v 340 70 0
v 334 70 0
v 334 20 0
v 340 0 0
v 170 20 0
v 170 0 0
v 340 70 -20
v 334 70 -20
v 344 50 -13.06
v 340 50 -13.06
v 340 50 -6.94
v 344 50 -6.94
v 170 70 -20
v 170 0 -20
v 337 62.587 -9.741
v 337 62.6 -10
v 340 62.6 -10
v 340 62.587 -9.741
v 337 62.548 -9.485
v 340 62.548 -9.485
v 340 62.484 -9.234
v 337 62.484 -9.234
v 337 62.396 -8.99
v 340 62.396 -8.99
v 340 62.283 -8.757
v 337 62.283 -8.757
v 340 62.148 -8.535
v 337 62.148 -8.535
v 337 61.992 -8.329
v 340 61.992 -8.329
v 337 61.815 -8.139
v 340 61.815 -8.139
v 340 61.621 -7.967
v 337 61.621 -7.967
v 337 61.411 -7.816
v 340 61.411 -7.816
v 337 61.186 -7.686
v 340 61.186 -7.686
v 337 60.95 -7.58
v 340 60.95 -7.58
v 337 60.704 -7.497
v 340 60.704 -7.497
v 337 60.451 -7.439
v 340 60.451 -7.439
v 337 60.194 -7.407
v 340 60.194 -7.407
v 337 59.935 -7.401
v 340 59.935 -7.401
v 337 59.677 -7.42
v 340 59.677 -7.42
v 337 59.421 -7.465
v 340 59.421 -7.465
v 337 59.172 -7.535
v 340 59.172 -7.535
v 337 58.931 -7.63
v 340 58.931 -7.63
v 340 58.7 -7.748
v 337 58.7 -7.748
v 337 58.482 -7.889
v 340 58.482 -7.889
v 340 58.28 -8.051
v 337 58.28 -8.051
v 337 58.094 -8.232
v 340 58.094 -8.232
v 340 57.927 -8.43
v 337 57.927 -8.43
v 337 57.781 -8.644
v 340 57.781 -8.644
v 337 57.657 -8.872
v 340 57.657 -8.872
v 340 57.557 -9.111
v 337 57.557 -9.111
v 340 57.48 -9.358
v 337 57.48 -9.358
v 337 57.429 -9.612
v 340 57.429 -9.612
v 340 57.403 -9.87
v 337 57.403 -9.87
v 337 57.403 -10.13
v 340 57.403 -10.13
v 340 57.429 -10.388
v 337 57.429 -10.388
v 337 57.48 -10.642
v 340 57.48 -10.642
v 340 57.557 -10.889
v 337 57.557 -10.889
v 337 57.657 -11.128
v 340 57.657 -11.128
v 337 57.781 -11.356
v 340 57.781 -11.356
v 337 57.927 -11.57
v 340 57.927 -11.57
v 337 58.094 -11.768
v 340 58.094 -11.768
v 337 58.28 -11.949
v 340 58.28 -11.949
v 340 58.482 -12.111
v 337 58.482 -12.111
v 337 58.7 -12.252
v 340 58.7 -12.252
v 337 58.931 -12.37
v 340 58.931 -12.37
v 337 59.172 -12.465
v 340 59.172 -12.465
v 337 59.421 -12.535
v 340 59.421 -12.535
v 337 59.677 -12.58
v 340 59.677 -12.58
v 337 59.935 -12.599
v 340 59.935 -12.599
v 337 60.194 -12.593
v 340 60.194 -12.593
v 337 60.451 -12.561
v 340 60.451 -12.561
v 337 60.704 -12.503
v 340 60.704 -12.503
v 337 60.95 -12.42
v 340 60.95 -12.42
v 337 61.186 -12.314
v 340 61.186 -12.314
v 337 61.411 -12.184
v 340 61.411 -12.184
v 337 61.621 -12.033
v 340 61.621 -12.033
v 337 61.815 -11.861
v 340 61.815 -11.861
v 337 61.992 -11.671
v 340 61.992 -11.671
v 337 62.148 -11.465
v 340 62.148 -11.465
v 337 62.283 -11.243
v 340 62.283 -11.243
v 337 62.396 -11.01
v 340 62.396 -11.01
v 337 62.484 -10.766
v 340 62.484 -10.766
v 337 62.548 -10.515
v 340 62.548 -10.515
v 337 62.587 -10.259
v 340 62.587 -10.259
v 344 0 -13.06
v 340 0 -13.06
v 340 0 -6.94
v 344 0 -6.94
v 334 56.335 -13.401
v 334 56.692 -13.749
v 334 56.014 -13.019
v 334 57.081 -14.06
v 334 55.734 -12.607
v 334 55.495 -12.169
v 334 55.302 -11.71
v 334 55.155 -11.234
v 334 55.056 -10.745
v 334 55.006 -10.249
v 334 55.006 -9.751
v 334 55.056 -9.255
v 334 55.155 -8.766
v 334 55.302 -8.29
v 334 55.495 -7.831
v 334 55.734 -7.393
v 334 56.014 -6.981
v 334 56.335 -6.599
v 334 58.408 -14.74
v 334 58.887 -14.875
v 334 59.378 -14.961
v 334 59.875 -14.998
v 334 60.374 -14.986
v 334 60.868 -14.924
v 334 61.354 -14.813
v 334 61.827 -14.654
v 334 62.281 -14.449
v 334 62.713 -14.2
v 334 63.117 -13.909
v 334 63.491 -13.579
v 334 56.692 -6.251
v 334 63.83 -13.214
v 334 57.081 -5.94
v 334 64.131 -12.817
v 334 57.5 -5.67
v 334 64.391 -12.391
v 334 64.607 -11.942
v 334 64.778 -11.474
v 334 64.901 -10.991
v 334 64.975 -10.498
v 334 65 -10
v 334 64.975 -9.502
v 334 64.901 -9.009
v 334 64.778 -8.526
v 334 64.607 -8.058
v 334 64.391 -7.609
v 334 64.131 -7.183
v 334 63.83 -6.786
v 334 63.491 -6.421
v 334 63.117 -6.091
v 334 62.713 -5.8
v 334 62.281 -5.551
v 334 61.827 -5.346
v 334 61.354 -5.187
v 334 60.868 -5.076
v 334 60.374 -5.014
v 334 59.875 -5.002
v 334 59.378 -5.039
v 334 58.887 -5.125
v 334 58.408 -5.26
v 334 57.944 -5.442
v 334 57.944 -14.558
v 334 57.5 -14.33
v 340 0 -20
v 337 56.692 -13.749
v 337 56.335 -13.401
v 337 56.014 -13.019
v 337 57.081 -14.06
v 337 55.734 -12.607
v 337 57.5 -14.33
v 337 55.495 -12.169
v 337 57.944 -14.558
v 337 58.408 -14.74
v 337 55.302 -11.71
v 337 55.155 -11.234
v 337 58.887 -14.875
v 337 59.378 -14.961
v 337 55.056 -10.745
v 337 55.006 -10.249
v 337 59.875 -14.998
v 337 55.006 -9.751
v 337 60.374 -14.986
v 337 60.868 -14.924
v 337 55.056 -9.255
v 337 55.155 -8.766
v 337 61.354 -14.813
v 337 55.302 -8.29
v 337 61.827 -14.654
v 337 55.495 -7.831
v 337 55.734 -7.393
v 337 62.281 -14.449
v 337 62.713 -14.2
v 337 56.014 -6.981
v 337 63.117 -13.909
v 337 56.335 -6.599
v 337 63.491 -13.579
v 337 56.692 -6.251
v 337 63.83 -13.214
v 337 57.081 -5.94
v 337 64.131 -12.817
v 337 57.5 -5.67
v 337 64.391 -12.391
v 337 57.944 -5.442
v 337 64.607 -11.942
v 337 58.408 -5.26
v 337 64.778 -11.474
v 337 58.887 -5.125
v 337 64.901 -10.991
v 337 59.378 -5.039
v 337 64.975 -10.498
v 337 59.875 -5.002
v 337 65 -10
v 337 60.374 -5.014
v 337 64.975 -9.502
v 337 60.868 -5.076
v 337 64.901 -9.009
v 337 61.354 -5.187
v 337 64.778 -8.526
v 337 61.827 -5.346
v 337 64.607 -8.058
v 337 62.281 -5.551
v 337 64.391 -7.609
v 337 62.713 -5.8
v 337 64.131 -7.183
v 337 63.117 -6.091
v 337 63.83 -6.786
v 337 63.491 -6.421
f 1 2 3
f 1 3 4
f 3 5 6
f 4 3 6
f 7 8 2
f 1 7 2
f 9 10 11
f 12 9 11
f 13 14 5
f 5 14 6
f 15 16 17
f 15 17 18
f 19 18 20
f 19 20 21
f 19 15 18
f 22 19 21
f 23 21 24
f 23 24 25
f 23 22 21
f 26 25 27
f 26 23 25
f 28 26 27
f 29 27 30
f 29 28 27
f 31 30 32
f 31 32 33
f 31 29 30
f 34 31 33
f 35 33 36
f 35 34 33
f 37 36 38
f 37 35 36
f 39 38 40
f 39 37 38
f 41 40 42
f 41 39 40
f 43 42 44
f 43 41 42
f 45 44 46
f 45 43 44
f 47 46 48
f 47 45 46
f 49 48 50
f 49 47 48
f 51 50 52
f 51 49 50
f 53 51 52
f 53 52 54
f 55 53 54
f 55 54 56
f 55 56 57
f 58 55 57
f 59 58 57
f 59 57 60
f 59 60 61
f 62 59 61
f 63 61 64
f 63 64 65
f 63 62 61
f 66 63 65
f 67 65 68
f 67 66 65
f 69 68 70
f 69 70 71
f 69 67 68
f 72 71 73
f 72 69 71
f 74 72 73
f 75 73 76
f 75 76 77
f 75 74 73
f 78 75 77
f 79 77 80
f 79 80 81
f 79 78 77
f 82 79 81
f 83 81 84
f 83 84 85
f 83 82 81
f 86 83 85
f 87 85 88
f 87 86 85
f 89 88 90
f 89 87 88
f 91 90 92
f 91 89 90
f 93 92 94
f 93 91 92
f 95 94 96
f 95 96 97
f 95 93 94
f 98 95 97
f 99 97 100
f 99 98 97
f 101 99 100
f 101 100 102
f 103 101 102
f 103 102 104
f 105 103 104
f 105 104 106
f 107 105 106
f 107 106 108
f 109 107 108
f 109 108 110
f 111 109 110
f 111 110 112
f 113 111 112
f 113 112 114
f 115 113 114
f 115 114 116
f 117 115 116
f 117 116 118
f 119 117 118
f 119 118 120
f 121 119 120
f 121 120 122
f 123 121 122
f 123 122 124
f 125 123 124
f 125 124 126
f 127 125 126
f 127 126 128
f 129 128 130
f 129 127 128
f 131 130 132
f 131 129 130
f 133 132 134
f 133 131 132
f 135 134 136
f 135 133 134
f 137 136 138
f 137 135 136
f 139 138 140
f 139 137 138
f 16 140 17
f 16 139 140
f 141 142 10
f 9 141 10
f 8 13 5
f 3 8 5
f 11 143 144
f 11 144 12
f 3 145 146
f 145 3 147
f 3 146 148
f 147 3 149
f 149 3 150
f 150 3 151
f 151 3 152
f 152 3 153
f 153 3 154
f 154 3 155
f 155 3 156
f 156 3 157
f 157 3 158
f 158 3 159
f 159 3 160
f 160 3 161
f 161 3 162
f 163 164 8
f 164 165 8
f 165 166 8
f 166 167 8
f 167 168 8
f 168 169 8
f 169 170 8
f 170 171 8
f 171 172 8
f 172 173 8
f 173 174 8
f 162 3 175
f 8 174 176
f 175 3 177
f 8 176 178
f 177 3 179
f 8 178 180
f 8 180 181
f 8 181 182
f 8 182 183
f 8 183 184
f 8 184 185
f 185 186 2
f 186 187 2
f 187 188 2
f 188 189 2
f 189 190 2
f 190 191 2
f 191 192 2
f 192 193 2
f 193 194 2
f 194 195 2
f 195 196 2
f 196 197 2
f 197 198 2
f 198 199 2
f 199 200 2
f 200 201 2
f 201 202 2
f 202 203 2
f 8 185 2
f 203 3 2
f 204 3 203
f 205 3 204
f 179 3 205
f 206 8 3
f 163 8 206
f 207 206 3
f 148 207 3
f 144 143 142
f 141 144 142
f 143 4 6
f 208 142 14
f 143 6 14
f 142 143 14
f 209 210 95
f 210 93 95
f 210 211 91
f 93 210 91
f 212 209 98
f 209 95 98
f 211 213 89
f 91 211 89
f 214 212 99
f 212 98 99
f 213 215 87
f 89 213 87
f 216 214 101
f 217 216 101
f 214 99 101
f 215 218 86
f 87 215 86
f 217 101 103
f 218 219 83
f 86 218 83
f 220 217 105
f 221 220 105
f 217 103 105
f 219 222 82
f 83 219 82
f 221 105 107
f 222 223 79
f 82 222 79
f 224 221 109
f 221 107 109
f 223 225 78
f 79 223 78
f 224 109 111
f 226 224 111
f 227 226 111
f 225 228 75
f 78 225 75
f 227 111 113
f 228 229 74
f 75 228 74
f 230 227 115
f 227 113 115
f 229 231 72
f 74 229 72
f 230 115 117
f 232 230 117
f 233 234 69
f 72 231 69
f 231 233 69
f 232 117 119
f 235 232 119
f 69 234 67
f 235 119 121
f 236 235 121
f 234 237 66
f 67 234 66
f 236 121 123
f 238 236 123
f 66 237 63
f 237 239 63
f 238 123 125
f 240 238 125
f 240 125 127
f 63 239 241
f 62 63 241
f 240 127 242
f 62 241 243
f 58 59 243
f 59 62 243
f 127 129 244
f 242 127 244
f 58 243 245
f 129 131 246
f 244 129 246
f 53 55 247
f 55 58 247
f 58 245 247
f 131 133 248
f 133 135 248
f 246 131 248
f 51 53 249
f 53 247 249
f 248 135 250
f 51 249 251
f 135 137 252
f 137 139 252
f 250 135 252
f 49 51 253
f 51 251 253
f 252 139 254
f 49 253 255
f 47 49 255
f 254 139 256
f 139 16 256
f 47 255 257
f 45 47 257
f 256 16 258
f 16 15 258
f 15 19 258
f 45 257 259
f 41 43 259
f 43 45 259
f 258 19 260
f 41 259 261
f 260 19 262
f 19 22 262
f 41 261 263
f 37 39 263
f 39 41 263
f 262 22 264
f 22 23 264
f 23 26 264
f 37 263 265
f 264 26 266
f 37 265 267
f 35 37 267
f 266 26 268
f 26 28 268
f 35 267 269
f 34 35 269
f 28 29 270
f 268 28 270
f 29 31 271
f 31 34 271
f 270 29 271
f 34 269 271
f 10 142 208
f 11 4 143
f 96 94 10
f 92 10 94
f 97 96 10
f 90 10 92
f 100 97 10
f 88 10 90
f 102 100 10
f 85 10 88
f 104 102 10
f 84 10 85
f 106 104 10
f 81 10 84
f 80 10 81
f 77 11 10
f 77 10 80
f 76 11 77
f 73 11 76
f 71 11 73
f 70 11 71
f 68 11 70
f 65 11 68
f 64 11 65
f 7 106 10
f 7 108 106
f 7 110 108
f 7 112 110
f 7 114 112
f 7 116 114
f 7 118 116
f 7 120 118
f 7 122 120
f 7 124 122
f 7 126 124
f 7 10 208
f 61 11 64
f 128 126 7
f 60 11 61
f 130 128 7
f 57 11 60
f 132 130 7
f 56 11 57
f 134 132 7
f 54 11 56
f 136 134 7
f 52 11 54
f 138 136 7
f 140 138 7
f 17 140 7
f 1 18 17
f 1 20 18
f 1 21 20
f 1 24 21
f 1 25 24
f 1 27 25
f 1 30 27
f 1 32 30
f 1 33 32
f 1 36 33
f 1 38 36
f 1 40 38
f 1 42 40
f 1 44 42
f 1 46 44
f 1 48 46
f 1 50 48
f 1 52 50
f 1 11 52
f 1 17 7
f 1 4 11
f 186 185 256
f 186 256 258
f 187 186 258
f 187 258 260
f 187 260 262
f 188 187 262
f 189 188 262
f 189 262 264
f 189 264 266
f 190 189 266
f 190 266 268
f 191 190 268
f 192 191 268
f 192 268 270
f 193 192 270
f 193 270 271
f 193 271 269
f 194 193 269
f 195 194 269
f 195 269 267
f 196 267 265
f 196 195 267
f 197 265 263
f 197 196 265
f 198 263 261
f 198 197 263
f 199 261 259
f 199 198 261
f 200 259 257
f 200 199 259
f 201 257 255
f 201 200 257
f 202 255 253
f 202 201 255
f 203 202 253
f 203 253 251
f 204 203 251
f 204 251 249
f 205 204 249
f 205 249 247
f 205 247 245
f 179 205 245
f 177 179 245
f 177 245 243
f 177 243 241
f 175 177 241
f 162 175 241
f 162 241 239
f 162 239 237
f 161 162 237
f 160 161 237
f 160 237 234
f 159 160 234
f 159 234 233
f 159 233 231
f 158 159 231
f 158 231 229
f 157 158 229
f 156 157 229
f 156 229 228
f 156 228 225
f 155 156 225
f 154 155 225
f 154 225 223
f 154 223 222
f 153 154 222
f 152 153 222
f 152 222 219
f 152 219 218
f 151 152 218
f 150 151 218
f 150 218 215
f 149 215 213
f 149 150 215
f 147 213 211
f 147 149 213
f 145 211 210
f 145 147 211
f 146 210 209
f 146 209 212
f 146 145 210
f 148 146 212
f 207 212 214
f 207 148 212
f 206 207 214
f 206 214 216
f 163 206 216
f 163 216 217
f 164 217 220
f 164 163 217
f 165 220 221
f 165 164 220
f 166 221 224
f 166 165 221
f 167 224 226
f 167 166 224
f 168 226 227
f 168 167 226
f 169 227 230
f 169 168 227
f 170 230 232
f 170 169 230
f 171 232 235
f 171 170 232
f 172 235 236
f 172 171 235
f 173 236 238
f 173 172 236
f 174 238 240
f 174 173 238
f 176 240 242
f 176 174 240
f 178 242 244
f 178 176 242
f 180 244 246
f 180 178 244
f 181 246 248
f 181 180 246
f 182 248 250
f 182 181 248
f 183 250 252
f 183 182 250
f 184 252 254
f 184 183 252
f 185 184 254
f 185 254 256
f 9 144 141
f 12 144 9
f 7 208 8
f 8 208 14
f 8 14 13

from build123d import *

# Parameters (mm, degrees)
SKETCH_1_W          = 170
SKETCH_1_H          = 20
EXTRUDE_1_DEPTH     = 70
CUT_EXTRUDE_1_DEPTH = 164
CUT_EXTRUDE_2_DEPTH = 3
SKETCH_4_R          = 2.6
CUT_EXTRUDE_3_DEPTH = 3
SKETCH_5_W          = 6.12
SKETCH_5_H          = 50
EXTRUDE_2_DEPTH     = 4
CUT_EXTRUDE_4_DEPTH = 200


with BuildPart() as part:
    # 草图1 → 凸台-拉伸1 (new body)
    with BuildSketch(Plane(origin=(0, 0, 0), x_dir=(1, 0, 0), z_dir=(0, 1, 0))):
        with Locations((85, 10)):
            Rectangle(SKETCH_1_W, SKETCH_1_H)
    extrude_1 = extrude(amount=EXTRUDE_1_DEPTH)

    # 草图2 → 切除-拉伸1 (cut)
    with BuildSketch(Plane(origin=(170, 0, 0), x_dir=(0, 0, -1), z_dir=(1, 0, 0))):
        Polygon((0, 70), (0, 20), (20, 70), align=None)
    cut_extrude_1 = extrude(amount=-CUT_EXTRUDE_1_DEPTH, mode=Mode.SUBTRACT)

    # 草图3 → 切除-拉伸2 (cut)
    with BuildSketch(Plane(origin=(6, 0, 0), x_dir=(0, 0, -1), z_dir=(1, 0, 0))):
        with BuildLine():
            ThreePointArc((10, 65), (6.464466094, 56.464466094), (15, 60))
            ThreePointArc((15, 60), (13.535533906, 63.535533906), (10, 65))
        make_face()
    cut_extrude_2 = extrude(amount=-CUT_EXTRUDE_2_DEPTH, mode=Mode.SUBTRACT)

    # 草图4 → 切除-拉伸3 (cut)
    with BuildSketch(Plane(origin=(3, 0, 0), x_dir=(0, 0, -1), z_dir=(1, 0, 0))):
        with Locations((10, 60)):
            Circle(SKETCH_4_R)
    cut_extrude_3 = extrude(amount=-CUT_EXTRUDE_3_DEPTH, mode=Mode.SUBTRACT)

    # 草图5 → 凸台-拉伸2 (add)
    with BuildSketch(Plane.ZY):
        with Locations((-10, 25)):
            Rectangle(SKETCH_5_W, SKETCH_5_H)
    extrude_2 = extrude(amount=EXTRUDE_2_DEPTH)

    # 镜向1: 凸台-拉伸1, 切除-拉伸1, 切除-拉伸2, 切除-拉伸3, 凸台-拉伸2 across plane
    add(extrude_1.mirror(Plane(origin=(170, 70, 0), x_dir=(0, 0, 1), z_dir=(-1, 0, 0))))
    add(cut_extrude_1.mirror(Plane(origin=(170, 70, 0), x_dir=(0, 0, 1), z_dir=(-1, 0, 0))), mode=Mode.SUBTRACT)
    add(cut_extrude_2.mirror(Plane(origin=(170, 70, 0), x_dir=(0, 0, 1), z_dir=(-1, 0, 0))), mode=Mode.SUBTRACT)
    add(cut_extrude_3.mirror(Plane(origin=(170, 70, 0), x_dir=(0, 0, 1), z_dir=(-1, 0, 0))), mode=Mode.SUBTRACT)
    add(extrude_2.mirror(Plane(origin=(170, 70, 0), x_dir=(0, 0, 1), z_dir=(-1, 0, 0))))

    # 草图6 → 切除-拉伸4 (cut)
    with BuildSketch(Plane.XZ):
        Polygon((170, 0), (0, 0), (0, -6.94), (-4, -6.94), (-4, -13.06), (0, -13.06), (0, -20), (170, -20), align=None)
    extrude(amount=-CUT_EXTRUDE_4_DEPTH, mode=Mode.SUBTRACT)


solid = part.part
